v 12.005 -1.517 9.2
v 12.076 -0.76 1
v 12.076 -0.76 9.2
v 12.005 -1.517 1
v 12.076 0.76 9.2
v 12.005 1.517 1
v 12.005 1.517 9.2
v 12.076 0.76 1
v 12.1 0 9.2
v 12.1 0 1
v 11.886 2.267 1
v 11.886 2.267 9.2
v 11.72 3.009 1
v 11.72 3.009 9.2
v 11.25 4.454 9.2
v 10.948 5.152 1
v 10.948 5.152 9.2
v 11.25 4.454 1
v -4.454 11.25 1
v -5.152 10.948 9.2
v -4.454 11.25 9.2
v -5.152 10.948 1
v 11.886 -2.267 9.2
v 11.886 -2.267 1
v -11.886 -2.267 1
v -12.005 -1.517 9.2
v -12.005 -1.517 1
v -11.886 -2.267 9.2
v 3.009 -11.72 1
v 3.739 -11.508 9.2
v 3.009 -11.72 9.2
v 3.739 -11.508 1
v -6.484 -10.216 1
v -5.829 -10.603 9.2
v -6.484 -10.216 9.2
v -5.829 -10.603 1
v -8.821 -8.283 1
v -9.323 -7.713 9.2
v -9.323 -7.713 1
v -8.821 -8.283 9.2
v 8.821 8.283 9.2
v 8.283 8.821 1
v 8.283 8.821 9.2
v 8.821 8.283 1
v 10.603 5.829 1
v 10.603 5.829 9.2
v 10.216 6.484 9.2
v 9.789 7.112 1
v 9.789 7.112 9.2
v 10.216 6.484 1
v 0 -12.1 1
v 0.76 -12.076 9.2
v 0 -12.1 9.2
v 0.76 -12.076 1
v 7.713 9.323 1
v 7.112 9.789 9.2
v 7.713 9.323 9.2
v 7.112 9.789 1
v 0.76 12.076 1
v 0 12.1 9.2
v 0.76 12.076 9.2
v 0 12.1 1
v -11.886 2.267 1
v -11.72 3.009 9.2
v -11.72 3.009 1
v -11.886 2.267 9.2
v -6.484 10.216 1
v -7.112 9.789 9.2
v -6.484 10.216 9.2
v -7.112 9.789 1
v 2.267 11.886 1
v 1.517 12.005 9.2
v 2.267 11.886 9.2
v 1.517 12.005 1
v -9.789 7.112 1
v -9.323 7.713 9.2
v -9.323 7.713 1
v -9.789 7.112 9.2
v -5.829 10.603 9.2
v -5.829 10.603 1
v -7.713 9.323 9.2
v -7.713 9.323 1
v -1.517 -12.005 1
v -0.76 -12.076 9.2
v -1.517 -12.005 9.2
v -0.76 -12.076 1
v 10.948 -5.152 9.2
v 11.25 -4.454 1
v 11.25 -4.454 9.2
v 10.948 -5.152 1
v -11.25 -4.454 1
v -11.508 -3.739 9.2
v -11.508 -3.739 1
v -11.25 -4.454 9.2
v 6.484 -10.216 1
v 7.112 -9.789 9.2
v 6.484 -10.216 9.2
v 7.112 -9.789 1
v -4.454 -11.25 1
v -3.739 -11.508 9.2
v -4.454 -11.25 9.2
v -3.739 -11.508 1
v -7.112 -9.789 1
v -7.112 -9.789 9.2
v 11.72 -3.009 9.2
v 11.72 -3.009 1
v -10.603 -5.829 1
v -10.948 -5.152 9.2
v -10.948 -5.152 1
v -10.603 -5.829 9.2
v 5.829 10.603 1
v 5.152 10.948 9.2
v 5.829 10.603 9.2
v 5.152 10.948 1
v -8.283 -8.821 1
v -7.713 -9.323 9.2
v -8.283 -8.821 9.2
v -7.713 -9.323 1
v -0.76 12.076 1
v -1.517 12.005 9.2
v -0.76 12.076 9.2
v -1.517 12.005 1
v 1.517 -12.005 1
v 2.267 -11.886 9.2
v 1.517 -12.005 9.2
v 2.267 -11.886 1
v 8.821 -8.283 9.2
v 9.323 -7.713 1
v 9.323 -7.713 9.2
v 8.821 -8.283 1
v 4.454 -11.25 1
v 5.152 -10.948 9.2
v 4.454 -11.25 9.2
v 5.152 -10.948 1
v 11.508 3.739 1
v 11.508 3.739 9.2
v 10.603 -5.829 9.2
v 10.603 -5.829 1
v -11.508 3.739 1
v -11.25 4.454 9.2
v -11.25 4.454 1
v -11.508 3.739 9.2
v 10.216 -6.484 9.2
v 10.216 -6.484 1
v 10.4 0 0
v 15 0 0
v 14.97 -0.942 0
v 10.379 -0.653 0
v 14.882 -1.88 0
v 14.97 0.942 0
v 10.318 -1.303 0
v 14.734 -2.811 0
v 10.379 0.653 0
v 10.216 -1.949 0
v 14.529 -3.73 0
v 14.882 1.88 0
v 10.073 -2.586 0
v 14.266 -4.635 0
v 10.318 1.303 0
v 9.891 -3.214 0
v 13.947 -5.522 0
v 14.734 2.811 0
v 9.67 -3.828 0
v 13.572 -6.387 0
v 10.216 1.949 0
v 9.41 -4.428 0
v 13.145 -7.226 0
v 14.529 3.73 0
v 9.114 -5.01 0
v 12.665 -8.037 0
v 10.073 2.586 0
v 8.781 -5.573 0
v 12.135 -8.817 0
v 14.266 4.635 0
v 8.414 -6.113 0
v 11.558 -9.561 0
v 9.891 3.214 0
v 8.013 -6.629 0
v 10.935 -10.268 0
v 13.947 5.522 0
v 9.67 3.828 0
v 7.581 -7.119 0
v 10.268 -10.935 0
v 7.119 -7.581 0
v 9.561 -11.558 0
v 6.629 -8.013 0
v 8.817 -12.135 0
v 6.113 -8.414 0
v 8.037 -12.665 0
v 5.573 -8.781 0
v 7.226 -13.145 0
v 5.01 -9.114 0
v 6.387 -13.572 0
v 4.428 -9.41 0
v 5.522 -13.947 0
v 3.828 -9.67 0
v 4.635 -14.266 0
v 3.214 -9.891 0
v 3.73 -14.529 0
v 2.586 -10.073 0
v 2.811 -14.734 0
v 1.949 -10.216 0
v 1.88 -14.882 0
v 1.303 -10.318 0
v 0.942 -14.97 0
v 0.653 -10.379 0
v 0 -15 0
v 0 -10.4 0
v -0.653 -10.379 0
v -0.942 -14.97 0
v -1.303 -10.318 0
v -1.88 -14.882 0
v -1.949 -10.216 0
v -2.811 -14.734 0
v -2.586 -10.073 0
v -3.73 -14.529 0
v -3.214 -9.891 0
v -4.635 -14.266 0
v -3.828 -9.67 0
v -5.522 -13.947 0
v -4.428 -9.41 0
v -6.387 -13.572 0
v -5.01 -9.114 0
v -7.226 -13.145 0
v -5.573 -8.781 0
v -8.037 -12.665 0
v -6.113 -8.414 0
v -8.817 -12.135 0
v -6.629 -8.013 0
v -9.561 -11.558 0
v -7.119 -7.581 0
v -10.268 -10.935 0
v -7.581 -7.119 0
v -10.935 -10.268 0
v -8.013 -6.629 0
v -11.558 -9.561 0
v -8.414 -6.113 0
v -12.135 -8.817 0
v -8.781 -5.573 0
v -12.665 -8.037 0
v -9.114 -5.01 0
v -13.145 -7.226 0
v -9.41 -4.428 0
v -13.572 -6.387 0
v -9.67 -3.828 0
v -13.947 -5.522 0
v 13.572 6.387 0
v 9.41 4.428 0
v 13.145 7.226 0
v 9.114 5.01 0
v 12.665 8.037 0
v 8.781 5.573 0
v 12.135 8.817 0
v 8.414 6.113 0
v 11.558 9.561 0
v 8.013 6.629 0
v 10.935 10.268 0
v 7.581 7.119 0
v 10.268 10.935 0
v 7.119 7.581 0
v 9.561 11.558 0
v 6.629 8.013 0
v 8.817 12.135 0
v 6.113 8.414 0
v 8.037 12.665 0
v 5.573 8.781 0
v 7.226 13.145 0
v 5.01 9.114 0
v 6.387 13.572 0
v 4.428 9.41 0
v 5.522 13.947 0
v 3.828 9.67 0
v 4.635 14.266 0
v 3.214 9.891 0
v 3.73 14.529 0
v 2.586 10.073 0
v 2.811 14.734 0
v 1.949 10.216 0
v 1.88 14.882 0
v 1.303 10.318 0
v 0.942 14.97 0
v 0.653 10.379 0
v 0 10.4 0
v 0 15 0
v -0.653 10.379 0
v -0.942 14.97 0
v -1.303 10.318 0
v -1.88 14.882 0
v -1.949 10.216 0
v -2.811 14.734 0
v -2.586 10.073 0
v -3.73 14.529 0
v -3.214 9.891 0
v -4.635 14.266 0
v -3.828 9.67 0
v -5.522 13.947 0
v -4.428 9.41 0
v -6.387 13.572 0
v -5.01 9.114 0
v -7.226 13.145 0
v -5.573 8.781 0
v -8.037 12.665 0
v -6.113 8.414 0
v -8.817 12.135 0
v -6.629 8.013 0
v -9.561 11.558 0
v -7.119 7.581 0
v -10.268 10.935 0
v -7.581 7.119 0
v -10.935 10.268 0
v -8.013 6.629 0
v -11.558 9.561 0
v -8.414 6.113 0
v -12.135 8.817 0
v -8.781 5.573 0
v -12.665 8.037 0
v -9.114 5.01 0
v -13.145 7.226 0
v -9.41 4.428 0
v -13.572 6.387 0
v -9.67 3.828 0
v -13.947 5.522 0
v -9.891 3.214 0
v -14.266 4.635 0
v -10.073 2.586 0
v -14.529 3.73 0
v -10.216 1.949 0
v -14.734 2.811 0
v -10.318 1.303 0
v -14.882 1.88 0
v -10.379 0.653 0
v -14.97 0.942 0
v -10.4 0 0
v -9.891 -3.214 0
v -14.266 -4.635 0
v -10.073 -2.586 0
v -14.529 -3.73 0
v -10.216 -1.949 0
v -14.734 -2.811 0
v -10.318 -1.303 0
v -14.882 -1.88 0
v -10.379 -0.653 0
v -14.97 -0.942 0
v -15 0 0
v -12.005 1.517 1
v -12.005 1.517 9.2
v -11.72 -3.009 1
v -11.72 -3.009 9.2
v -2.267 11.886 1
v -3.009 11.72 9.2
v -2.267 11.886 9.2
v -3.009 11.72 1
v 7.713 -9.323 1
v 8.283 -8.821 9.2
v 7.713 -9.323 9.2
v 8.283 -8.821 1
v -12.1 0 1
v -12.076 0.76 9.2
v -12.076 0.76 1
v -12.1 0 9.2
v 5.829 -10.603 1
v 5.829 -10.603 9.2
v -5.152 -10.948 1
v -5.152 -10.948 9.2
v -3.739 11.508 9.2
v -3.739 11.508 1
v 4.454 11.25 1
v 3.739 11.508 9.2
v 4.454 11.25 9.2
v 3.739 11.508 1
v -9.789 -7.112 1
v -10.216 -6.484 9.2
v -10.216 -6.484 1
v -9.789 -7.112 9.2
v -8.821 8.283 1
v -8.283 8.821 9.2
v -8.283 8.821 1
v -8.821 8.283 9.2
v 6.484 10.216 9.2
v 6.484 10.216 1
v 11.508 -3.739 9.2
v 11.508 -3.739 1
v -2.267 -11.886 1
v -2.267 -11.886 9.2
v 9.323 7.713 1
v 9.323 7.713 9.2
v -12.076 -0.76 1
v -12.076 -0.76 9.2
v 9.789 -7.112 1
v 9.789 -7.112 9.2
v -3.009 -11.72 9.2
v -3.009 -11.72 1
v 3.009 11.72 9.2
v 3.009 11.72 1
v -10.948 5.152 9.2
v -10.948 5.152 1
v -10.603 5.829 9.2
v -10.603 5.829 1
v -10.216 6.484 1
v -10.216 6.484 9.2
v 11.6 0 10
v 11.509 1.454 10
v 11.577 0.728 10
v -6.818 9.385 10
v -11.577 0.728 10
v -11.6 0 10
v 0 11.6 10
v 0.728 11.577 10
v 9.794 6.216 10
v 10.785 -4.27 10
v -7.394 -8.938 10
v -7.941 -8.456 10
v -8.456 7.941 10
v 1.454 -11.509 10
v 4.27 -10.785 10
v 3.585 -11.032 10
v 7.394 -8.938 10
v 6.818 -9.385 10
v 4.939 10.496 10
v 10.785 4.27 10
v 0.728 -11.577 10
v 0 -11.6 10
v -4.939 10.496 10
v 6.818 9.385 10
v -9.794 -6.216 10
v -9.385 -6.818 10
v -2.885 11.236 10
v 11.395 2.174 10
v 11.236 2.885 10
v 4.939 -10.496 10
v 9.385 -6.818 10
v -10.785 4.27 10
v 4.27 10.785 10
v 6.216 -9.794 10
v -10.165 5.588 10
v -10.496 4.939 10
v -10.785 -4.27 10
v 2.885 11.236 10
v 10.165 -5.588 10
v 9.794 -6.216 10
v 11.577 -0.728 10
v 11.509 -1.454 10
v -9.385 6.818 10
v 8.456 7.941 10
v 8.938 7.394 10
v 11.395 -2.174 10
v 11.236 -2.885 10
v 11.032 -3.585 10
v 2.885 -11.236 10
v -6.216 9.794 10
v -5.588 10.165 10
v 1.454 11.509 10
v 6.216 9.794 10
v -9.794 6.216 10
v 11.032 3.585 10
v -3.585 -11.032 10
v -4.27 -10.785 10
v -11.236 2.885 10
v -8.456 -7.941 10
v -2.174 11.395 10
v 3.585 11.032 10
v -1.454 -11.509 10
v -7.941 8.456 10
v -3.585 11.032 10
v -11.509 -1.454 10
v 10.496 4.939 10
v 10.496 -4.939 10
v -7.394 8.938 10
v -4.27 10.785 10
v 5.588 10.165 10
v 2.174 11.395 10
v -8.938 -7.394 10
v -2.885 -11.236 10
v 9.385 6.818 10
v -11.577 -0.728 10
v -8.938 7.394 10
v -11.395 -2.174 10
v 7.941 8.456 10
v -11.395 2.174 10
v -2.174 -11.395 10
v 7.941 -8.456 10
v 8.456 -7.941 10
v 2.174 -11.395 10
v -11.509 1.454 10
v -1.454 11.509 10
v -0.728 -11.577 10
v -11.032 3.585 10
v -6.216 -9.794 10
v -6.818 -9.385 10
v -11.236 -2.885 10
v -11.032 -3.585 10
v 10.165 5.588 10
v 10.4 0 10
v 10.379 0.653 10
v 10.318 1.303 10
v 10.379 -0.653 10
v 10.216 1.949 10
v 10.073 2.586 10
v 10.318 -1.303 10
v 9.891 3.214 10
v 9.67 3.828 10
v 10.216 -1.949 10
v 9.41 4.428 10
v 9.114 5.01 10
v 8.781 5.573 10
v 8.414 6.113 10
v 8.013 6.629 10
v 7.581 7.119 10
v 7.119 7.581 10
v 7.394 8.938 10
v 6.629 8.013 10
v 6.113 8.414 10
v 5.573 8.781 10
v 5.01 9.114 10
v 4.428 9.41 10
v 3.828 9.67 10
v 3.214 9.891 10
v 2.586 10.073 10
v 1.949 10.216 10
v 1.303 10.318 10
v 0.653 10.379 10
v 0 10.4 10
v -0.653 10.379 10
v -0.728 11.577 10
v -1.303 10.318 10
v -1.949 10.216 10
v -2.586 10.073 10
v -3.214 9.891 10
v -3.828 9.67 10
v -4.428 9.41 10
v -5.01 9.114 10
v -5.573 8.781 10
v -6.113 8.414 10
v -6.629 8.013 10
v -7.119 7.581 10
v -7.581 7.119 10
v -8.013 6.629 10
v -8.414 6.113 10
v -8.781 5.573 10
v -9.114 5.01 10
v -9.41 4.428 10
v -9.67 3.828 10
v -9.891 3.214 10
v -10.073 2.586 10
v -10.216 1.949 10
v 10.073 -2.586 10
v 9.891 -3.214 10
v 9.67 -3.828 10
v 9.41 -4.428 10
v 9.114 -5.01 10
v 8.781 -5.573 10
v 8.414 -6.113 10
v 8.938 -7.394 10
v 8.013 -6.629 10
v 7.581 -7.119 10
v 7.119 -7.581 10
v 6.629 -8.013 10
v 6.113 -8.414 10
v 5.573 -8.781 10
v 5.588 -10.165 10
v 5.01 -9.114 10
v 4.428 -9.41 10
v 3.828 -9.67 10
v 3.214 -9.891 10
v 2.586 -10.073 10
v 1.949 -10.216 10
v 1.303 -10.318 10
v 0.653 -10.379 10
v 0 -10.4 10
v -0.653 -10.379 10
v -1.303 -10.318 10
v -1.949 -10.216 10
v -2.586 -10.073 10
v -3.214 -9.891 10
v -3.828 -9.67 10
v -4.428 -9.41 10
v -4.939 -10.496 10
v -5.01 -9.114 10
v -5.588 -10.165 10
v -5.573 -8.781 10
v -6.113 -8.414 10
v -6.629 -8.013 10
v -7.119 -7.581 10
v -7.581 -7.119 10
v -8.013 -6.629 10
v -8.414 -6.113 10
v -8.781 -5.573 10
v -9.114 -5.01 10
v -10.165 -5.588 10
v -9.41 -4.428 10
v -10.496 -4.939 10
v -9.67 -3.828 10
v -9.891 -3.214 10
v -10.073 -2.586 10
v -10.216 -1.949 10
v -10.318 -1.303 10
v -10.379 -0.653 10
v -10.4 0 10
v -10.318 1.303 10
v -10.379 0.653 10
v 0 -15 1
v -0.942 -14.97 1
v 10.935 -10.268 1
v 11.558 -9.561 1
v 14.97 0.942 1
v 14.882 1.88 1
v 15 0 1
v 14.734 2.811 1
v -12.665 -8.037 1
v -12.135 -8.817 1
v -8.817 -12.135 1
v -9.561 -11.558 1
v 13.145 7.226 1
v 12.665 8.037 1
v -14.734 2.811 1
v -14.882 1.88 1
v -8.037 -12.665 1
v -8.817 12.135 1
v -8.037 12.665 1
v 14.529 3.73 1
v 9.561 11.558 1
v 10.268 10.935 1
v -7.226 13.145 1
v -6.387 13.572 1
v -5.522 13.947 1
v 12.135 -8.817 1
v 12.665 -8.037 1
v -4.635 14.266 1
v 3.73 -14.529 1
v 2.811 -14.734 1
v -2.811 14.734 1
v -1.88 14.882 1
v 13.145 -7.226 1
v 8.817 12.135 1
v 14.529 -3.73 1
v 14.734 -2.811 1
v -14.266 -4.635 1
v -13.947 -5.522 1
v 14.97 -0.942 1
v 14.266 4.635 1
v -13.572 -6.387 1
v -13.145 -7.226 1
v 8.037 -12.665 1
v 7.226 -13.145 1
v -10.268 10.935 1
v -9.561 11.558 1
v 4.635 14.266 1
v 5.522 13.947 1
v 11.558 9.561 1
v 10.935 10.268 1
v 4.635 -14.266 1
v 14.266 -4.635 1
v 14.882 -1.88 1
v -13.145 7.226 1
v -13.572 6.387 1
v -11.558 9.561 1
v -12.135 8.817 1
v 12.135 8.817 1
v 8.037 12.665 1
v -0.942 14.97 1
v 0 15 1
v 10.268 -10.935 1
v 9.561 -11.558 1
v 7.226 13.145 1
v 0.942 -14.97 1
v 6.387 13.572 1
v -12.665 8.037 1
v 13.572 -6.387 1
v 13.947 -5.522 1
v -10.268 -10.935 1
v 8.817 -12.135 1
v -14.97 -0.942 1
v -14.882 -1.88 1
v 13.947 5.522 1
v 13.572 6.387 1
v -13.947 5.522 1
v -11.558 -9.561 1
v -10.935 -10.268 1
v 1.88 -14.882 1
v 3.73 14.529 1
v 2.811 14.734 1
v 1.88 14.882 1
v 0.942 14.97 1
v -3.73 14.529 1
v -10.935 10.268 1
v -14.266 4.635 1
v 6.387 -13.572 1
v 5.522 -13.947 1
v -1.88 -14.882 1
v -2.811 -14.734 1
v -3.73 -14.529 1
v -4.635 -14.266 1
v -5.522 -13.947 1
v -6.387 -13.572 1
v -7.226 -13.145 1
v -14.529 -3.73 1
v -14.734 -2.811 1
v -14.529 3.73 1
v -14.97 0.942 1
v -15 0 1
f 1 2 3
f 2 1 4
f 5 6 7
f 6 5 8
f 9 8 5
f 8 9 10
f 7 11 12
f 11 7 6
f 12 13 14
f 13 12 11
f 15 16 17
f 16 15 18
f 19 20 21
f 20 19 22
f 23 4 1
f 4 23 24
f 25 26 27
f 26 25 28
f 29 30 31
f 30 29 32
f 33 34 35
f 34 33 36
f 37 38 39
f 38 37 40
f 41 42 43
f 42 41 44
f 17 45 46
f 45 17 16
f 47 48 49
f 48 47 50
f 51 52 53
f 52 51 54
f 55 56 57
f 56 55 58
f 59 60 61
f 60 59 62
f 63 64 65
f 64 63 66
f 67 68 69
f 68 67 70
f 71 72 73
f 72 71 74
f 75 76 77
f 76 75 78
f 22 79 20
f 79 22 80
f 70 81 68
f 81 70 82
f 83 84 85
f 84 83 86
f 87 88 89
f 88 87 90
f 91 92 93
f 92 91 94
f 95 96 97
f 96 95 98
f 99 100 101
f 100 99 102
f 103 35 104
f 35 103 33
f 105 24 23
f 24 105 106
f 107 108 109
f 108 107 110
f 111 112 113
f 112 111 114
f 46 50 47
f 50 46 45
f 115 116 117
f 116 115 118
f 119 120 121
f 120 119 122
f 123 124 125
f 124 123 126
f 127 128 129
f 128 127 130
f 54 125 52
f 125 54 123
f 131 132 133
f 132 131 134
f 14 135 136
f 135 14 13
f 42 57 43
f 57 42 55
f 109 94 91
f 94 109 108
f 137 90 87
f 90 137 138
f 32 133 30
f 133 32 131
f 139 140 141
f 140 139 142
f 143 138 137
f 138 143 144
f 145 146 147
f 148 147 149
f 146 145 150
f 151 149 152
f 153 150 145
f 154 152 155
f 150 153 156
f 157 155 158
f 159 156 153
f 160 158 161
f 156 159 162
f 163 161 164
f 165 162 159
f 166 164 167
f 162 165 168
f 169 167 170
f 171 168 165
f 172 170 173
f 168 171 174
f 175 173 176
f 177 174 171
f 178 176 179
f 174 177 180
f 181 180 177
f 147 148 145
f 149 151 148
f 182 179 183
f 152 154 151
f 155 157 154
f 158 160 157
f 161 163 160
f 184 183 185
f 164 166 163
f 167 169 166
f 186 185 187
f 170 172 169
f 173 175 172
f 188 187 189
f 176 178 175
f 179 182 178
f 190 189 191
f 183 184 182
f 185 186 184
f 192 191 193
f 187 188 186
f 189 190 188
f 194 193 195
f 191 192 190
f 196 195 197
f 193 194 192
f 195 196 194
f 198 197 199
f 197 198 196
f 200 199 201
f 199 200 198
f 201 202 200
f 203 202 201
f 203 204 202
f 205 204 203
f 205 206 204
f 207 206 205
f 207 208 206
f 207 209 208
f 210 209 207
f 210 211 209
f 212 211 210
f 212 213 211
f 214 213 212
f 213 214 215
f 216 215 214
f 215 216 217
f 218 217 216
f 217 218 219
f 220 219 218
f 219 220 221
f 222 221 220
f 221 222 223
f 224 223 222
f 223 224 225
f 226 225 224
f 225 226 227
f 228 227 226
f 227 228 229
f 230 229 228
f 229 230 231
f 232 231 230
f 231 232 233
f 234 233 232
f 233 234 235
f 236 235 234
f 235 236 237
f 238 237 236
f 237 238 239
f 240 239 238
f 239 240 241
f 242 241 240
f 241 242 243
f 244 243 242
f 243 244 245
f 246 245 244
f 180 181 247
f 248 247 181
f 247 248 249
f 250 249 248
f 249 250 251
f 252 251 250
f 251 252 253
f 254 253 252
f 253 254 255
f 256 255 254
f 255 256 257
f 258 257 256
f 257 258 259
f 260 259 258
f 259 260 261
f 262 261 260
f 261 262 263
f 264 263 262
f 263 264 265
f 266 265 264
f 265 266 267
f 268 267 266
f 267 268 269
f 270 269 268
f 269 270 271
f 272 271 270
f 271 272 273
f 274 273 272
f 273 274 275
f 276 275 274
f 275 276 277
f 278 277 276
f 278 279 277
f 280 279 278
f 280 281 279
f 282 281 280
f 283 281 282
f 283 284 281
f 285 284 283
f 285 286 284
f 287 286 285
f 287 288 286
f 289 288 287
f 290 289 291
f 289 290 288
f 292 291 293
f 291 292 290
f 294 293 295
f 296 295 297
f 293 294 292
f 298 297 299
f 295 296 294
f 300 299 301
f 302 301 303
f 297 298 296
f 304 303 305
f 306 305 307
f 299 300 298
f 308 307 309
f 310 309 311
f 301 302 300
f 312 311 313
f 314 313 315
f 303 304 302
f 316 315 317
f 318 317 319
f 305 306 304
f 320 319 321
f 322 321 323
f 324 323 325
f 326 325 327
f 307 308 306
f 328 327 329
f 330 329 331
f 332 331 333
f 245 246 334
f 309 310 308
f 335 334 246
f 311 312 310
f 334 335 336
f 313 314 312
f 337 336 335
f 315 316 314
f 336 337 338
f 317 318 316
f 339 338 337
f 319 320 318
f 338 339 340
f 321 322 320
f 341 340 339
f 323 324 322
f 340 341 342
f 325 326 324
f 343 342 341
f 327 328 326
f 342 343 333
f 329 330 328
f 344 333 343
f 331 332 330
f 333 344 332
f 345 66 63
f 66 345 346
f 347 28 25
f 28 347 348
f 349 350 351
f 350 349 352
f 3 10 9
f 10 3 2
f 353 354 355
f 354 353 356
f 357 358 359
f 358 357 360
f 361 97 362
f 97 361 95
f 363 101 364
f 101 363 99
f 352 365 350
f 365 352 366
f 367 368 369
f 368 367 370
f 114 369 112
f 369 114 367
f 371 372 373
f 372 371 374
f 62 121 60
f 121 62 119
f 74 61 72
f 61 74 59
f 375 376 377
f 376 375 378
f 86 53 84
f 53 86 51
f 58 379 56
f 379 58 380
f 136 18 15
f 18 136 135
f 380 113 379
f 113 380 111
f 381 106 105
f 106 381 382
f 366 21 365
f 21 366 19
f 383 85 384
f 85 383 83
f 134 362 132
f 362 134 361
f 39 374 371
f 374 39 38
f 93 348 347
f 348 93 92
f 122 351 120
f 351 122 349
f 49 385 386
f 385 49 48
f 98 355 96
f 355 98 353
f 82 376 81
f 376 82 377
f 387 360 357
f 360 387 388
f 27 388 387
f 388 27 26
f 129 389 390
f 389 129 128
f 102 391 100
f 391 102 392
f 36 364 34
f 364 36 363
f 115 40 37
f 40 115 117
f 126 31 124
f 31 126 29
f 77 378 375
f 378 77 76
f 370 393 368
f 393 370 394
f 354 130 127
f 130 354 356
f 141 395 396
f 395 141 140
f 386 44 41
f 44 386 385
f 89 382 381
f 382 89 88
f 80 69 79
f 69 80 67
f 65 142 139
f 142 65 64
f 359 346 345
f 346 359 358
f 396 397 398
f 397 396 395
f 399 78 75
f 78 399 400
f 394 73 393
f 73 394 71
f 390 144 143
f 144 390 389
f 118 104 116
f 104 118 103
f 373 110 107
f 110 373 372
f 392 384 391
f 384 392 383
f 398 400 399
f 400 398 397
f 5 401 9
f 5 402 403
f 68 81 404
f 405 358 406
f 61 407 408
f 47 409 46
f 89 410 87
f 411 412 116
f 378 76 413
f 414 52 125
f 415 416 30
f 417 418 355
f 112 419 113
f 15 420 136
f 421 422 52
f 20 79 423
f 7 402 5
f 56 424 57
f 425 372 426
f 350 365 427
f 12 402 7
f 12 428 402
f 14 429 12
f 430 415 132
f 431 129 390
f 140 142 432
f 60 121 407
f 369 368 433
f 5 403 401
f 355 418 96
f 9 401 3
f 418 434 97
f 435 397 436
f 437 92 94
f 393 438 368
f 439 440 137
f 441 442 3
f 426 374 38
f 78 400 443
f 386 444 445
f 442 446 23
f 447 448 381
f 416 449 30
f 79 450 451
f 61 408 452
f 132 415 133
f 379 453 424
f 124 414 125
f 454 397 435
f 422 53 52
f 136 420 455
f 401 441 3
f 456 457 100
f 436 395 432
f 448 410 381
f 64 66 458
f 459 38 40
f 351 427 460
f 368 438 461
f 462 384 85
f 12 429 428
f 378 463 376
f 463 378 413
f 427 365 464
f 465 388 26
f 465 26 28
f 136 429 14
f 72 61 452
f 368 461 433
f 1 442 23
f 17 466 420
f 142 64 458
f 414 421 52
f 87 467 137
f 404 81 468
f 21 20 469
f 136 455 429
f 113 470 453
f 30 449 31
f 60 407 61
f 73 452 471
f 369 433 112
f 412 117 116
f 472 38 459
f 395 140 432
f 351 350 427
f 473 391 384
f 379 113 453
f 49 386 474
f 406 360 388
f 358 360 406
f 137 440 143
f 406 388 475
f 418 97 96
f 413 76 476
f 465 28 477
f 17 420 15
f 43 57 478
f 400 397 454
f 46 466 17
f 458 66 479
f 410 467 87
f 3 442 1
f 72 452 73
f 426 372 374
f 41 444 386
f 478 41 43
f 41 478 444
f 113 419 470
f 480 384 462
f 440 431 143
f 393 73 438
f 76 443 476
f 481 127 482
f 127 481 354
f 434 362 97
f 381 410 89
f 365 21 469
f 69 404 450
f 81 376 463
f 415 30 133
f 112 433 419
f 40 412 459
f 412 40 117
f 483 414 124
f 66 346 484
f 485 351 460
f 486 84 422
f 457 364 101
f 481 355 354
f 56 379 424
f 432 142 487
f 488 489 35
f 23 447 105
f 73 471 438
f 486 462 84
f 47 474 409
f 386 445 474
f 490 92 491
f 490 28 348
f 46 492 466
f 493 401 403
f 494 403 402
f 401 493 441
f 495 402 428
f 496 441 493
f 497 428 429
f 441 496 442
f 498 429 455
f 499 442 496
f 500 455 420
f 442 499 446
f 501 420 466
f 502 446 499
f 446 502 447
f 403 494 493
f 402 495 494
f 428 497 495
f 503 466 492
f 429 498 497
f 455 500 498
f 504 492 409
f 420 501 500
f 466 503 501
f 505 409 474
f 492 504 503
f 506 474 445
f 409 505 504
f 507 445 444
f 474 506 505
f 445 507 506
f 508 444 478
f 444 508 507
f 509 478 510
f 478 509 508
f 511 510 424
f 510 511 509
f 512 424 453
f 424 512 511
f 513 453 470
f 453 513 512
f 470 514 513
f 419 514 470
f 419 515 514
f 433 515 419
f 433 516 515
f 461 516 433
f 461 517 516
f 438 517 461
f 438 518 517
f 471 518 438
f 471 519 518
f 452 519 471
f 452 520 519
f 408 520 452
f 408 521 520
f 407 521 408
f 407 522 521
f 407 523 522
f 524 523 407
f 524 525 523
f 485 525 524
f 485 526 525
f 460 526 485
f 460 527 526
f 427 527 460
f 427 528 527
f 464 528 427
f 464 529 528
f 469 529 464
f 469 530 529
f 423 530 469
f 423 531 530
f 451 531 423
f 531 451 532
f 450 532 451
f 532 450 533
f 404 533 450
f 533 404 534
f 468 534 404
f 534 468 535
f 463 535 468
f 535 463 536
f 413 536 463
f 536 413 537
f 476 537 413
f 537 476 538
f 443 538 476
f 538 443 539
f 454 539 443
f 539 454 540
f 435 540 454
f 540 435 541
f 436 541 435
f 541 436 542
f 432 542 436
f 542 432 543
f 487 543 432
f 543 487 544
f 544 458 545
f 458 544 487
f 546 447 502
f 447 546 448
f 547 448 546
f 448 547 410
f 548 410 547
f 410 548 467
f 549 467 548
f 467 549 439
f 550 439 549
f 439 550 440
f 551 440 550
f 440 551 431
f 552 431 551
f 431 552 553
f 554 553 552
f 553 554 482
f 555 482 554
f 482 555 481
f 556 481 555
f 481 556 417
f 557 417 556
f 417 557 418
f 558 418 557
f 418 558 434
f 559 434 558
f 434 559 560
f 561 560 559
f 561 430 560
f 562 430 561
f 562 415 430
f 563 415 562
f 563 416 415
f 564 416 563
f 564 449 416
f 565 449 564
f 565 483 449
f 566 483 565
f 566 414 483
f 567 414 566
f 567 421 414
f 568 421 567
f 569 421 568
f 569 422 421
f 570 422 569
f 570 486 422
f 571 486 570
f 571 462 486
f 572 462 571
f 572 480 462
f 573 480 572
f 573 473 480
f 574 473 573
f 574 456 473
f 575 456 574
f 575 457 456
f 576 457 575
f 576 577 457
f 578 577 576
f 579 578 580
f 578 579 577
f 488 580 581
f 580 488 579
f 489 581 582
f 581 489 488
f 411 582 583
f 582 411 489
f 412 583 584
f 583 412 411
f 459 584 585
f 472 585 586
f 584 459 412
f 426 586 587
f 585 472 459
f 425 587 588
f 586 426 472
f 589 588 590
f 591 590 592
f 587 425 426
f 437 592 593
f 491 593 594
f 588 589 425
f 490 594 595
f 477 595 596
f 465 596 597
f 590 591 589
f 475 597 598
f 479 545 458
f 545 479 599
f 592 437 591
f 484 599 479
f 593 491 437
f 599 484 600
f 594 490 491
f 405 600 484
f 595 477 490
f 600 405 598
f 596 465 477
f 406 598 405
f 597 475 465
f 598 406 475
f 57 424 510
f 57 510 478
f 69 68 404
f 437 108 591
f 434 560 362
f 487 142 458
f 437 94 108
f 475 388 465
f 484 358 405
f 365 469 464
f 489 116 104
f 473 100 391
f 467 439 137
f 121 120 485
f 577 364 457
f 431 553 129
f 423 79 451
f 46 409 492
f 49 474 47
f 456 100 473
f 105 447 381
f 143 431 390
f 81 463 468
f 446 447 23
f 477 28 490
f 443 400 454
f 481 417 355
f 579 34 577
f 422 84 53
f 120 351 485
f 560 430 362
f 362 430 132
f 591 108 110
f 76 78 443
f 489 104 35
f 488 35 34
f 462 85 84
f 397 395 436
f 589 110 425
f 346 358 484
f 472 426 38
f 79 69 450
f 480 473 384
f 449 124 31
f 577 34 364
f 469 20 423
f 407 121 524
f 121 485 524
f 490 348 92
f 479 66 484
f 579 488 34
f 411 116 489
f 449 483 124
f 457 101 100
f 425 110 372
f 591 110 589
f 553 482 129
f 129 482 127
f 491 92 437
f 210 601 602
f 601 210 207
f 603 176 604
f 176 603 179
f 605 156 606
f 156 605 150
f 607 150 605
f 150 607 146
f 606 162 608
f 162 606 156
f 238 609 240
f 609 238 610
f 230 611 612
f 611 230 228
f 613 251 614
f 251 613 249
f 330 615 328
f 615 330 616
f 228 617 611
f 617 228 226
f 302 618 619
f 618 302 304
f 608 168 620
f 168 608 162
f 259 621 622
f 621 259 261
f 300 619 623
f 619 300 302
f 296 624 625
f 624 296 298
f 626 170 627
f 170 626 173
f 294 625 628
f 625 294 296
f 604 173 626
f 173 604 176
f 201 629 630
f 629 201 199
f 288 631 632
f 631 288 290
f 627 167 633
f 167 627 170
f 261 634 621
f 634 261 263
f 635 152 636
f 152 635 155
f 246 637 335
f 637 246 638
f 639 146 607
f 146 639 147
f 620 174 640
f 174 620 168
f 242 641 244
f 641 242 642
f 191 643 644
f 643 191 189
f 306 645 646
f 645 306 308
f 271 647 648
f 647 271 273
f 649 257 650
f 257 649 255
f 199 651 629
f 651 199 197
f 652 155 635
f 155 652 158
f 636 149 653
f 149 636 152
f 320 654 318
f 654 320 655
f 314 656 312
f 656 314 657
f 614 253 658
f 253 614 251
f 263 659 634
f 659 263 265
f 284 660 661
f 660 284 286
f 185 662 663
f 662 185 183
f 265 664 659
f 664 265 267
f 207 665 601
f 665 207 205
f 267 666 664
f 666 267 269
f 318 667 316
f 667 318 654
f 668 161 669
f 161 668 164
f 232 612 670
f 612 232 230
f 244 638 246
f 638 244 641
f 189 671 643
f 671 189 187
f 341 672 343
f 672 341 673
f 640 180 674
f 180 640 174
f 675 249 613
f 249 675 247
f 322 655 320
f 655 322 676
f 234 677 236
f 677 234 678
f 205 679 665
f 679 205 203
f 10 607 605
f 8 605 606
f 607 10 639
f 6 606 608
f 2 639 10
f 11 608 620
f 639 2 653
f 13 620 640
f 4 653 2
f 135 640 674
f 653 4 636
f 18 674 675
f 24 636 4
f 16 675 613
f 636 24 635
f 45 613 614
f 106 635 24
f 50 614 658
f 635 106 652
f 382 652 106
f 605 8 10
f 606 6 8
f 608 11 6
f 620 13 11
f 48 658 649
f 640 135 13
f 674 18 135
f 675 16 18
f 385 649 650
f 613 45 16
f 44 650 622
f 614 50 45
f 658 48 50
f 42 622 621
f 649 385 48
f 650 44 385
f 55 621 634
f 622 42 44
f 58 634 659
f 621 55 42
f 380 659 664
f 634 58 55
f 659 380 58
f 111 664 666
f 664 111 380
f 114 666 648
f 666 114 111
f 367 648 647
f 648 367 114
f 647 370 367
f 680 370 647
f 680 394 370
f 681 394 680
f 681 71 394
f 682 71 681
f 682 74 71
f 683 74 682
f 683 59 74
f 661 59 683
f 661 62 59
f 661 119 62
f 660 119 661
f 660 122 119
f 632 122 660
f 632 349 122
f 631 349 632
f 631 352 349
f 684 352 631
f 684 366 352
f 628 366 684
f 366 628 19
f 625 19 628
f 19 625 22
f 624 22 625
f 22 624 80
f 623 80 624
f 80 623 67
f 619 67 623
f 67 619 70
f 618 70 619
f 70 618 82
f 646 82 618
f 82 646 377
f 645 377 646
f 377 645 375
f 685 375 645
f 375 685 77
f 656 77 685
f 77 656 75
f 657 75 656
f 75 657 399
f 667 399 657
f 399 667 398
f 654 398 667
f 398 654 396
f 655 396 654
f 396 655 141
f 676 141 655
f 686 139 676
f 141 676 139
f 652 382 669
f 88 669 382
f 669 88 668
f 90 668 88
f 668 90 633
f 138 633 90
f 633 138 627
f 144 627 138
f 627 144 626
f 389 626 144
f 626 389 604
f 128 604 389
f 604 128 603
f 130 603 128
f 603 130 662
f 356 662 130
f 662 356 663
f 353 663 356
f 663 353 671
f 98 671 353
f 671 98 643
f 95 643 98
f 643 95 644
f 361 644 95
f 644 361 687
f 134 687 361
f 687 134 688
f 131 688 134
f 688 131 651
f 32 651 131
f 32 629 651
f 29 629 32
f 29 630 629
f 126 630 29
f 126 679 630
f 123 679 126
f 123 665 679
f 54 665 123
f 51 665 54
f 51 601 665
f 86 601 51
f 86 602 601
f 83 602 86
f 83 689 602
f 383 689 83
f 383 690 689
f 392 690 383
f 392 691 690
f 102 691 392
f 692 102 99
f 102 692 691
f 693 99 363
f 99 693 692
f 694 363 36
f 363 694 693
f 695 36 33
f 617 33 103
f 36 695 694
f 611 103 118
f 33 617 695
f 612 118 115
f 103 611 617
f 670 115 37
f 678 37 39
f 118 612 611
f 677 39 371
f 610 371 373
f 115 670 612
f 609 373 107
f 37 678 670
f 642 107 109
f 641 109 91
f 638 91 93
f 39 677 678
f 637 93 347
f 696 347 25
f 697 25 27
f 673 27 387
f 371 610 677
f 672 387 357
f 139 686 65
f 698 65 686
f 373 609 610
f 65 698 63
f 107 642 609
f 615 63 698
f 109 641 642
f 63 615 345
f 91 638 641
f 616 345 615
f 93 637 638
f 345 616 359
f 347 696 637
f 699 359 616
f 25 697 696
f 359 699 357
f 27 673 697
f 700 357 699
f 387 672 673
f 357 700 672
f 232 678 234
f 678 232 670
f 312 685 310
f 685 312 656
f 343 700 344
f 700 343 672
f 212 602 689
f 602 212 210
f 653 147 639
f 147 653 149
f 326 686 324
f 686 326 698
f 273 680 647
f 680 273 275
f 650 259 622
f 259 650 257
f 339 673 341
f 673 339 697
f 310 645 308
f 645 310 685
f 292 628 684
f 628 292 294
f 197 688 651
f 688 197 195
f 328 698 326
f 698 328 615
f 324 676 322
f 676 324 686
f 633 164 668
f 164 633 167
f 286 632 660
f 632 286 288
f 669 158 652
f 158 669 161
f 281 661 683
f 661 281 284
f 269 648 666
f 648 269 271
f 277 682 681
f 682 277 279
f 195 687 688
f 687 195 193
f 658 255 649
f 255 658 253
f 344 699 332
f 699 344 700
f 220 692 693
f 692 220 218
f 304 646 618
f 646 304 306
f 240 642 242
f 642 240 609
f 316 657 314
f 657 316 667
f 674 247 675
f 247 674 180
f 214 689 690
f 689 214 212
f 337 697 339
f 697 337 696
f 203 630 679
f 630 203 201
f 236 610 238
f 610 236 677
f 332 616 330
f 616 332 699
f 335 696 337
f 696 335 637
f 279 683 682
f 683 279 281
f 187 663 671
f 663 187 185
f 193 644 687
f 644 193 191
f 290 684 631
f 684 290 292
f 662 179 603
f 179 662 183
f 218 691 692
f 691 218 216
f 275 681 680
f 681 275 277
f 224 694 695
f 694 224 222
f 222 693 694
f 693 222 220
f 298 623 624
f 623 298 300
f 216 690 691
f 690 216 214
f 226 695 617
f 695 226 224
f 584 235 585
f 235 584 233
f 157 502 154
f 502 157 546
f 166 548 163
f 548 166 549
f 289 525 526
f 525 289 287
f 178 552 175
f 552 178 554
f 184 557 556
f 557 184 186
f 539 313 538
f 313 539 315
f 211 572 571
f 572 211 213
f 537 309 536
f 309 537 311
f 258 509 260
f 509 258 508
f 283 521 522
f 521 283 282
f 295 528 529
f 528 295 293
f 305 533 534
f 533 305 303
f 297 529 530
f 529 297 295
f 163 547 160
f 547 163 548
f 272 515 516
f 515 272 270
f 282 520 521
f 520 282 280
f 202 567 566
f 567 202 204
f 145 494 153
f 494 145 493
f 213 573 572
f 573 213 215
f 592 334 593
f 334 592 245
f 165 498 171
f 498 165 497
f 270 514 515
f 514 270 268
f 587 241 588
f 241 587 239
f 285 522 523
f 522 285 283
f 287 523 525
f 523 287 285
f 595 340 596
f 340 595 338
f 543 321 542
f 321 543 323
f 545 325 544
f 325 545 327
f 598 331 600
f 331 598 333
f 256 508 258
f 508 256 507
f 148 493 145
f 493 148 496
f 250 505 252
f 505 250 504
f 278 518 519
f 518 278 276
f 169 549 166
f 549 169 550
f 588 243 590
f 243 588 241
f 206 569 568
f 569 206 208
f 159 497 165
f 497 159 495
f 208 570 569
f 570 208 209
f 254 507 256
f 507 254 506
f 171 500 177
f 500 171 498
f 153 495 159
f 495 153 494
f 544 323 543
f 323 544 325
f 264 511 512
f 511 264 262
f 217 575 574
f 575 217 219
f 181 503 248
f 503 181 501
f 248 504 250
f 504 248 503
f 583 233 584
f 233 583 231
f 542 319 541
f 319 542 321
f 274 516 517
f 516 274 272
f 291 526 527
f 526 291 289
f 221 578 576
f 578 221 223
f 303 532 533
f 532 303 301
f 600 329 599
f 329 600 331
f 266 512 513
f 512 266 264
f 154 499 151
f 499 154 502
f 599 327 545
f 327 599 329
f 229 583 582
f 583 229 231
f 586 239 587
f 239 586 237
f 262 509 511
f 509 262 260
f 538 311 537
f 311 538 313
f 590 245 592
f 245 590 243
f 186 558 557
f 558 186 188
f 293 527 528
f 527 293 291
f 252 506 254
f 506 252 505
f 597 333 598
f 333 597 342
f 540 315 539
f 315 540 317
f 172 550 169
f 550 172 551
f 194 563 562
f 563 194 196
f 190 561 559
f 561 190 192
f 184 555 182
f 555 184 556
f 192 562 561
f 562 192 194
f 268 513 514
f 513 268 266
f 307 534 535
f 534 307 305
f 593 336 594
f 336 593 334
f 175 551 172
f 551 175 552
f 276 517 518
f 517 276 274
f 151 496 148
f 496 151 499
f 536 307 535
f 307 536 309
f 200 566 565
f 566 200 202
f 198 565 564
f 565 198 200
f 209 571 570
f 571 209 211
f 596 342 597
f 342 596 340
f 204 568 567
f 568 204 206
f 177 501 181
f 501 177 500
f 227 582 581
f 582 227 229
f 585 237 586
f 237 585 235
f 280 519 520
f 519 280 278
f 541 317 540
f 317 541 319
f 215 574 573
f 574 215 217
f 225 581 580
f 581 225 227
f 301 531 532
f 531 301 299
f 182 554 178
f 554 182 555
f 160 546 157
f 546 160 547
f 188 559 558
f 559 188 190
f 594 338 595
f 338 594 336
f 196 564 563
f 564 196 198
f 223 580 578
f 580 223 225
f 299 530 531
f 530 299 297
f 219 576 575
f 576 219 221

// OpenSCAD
//igus bearing-generator – fully customizable
// -Beta test - v. 0.8 - 30.12.16  Tom Krause

//Use iglidur tribofilament in order to reach similar wear-characteristics as with conventional iglidur bearings. Always lubricant-free, maintenance-free and easy to print with iglidur I150 tribofilament.

//Check this website for more information: www.igus.eu/tribofilament

//Here are some tips how to use the "bearing-generator":
    //Choose "flange", if you have axial forces.
    //Choose "slit", if the bearing should have a slit in order to mount it more easily.
    //Be aware of clearance.
    //Be aware that the real inside-diameter will be smaller than in the 3d-model.
    //Be aware of oversize at the outside-diameter. If you want to have one “press-fit”.
    //Settings at the printer: with small wall-thicknesses you may need to reduce the “parameters” to 1 and you may also need to adjust the “shell-thickness”. Otherwise changes at the 3d-model won’t affect the printed part.
//Choose with or without flange
flange="yes"; // [yes,no]
//Choose with or without slit
slit="no"; // [yes,no]
//[mm]
insidediameter=10.4;
//[mm]
outsidediameter=12.1;
//[mm]
length=10.0;
//[mm] no effect when "no flange" selected
flangediameter=15.0;
//[mm] no effect when "no flange" selected
flangethicknes=1.0;
//[mm] no effect when "no slit" selected
slit_width=1.0;
//[°] no effect when "no slit" selected
slit_angle=10; // [0,10,20]
d1=insidediameter;
d2=outsidediameter;
b1=length;
d3=flangediameter;
b2=flangethicknes;
b3=slit_width;
a=slit_angle;
if(((b2+1)>b1)&&flange=="yes")
   {translate([d3+d2+d1,0,b1+3])text("flange too thick",size=(8+(d3+d2+d1)/3));}
if((d2-d1)<1)
   {translate([d3+d2+d1,(14+(d3+d2+d1)/3),b1+3])text("increase wallthickness",size=(8+(d3+d2+d1)/3));}
if(d3<d2&&flange=="yes")
   {translate([d3+d2+d1,-(14+(d3+d2+d1)/3),b1+3])text("increase flangediameter",size=(8+(d3+d2+d1)/3));}  
    module bearing() 
{ 
    if(flange=="no") {difference() { 
    union () {cylinder(b1-0.8,d2,d2,$fn=100);translate([0,0,b1-0.8]) 
    cylinder(0.8,d2,d2-0.5,$fn=100);}
    translate([0,0,-1]) 
    cylinder(b1+2,d1,d1,$fn=100);if(slit=="yes") { translate([d2,0,b1/2-1]) rotate([a,0,0]) cube([d2*2,b3,b1*1.5+4],center=true);}}
    }
    else
        difference() { 
    union () {cylinder(b1-0.8,d2,d2,$fn=100);translate([0,0,b1-0.8]) 
    cylinder(0.8,d2,d2-0.5,$fn=100);cylinder(b2,d3,d3,$fn=100);}
    translate([0,0,-1]) 
    cylinder(b1+2,d1,d1,$fn=100);if(slit=="yes") { translate([d3,0,b1/2-1]) rotate([a,0,0]) cube([d3*2,b3,b1*1.5+4],center=true);}}   
}
bearing();
